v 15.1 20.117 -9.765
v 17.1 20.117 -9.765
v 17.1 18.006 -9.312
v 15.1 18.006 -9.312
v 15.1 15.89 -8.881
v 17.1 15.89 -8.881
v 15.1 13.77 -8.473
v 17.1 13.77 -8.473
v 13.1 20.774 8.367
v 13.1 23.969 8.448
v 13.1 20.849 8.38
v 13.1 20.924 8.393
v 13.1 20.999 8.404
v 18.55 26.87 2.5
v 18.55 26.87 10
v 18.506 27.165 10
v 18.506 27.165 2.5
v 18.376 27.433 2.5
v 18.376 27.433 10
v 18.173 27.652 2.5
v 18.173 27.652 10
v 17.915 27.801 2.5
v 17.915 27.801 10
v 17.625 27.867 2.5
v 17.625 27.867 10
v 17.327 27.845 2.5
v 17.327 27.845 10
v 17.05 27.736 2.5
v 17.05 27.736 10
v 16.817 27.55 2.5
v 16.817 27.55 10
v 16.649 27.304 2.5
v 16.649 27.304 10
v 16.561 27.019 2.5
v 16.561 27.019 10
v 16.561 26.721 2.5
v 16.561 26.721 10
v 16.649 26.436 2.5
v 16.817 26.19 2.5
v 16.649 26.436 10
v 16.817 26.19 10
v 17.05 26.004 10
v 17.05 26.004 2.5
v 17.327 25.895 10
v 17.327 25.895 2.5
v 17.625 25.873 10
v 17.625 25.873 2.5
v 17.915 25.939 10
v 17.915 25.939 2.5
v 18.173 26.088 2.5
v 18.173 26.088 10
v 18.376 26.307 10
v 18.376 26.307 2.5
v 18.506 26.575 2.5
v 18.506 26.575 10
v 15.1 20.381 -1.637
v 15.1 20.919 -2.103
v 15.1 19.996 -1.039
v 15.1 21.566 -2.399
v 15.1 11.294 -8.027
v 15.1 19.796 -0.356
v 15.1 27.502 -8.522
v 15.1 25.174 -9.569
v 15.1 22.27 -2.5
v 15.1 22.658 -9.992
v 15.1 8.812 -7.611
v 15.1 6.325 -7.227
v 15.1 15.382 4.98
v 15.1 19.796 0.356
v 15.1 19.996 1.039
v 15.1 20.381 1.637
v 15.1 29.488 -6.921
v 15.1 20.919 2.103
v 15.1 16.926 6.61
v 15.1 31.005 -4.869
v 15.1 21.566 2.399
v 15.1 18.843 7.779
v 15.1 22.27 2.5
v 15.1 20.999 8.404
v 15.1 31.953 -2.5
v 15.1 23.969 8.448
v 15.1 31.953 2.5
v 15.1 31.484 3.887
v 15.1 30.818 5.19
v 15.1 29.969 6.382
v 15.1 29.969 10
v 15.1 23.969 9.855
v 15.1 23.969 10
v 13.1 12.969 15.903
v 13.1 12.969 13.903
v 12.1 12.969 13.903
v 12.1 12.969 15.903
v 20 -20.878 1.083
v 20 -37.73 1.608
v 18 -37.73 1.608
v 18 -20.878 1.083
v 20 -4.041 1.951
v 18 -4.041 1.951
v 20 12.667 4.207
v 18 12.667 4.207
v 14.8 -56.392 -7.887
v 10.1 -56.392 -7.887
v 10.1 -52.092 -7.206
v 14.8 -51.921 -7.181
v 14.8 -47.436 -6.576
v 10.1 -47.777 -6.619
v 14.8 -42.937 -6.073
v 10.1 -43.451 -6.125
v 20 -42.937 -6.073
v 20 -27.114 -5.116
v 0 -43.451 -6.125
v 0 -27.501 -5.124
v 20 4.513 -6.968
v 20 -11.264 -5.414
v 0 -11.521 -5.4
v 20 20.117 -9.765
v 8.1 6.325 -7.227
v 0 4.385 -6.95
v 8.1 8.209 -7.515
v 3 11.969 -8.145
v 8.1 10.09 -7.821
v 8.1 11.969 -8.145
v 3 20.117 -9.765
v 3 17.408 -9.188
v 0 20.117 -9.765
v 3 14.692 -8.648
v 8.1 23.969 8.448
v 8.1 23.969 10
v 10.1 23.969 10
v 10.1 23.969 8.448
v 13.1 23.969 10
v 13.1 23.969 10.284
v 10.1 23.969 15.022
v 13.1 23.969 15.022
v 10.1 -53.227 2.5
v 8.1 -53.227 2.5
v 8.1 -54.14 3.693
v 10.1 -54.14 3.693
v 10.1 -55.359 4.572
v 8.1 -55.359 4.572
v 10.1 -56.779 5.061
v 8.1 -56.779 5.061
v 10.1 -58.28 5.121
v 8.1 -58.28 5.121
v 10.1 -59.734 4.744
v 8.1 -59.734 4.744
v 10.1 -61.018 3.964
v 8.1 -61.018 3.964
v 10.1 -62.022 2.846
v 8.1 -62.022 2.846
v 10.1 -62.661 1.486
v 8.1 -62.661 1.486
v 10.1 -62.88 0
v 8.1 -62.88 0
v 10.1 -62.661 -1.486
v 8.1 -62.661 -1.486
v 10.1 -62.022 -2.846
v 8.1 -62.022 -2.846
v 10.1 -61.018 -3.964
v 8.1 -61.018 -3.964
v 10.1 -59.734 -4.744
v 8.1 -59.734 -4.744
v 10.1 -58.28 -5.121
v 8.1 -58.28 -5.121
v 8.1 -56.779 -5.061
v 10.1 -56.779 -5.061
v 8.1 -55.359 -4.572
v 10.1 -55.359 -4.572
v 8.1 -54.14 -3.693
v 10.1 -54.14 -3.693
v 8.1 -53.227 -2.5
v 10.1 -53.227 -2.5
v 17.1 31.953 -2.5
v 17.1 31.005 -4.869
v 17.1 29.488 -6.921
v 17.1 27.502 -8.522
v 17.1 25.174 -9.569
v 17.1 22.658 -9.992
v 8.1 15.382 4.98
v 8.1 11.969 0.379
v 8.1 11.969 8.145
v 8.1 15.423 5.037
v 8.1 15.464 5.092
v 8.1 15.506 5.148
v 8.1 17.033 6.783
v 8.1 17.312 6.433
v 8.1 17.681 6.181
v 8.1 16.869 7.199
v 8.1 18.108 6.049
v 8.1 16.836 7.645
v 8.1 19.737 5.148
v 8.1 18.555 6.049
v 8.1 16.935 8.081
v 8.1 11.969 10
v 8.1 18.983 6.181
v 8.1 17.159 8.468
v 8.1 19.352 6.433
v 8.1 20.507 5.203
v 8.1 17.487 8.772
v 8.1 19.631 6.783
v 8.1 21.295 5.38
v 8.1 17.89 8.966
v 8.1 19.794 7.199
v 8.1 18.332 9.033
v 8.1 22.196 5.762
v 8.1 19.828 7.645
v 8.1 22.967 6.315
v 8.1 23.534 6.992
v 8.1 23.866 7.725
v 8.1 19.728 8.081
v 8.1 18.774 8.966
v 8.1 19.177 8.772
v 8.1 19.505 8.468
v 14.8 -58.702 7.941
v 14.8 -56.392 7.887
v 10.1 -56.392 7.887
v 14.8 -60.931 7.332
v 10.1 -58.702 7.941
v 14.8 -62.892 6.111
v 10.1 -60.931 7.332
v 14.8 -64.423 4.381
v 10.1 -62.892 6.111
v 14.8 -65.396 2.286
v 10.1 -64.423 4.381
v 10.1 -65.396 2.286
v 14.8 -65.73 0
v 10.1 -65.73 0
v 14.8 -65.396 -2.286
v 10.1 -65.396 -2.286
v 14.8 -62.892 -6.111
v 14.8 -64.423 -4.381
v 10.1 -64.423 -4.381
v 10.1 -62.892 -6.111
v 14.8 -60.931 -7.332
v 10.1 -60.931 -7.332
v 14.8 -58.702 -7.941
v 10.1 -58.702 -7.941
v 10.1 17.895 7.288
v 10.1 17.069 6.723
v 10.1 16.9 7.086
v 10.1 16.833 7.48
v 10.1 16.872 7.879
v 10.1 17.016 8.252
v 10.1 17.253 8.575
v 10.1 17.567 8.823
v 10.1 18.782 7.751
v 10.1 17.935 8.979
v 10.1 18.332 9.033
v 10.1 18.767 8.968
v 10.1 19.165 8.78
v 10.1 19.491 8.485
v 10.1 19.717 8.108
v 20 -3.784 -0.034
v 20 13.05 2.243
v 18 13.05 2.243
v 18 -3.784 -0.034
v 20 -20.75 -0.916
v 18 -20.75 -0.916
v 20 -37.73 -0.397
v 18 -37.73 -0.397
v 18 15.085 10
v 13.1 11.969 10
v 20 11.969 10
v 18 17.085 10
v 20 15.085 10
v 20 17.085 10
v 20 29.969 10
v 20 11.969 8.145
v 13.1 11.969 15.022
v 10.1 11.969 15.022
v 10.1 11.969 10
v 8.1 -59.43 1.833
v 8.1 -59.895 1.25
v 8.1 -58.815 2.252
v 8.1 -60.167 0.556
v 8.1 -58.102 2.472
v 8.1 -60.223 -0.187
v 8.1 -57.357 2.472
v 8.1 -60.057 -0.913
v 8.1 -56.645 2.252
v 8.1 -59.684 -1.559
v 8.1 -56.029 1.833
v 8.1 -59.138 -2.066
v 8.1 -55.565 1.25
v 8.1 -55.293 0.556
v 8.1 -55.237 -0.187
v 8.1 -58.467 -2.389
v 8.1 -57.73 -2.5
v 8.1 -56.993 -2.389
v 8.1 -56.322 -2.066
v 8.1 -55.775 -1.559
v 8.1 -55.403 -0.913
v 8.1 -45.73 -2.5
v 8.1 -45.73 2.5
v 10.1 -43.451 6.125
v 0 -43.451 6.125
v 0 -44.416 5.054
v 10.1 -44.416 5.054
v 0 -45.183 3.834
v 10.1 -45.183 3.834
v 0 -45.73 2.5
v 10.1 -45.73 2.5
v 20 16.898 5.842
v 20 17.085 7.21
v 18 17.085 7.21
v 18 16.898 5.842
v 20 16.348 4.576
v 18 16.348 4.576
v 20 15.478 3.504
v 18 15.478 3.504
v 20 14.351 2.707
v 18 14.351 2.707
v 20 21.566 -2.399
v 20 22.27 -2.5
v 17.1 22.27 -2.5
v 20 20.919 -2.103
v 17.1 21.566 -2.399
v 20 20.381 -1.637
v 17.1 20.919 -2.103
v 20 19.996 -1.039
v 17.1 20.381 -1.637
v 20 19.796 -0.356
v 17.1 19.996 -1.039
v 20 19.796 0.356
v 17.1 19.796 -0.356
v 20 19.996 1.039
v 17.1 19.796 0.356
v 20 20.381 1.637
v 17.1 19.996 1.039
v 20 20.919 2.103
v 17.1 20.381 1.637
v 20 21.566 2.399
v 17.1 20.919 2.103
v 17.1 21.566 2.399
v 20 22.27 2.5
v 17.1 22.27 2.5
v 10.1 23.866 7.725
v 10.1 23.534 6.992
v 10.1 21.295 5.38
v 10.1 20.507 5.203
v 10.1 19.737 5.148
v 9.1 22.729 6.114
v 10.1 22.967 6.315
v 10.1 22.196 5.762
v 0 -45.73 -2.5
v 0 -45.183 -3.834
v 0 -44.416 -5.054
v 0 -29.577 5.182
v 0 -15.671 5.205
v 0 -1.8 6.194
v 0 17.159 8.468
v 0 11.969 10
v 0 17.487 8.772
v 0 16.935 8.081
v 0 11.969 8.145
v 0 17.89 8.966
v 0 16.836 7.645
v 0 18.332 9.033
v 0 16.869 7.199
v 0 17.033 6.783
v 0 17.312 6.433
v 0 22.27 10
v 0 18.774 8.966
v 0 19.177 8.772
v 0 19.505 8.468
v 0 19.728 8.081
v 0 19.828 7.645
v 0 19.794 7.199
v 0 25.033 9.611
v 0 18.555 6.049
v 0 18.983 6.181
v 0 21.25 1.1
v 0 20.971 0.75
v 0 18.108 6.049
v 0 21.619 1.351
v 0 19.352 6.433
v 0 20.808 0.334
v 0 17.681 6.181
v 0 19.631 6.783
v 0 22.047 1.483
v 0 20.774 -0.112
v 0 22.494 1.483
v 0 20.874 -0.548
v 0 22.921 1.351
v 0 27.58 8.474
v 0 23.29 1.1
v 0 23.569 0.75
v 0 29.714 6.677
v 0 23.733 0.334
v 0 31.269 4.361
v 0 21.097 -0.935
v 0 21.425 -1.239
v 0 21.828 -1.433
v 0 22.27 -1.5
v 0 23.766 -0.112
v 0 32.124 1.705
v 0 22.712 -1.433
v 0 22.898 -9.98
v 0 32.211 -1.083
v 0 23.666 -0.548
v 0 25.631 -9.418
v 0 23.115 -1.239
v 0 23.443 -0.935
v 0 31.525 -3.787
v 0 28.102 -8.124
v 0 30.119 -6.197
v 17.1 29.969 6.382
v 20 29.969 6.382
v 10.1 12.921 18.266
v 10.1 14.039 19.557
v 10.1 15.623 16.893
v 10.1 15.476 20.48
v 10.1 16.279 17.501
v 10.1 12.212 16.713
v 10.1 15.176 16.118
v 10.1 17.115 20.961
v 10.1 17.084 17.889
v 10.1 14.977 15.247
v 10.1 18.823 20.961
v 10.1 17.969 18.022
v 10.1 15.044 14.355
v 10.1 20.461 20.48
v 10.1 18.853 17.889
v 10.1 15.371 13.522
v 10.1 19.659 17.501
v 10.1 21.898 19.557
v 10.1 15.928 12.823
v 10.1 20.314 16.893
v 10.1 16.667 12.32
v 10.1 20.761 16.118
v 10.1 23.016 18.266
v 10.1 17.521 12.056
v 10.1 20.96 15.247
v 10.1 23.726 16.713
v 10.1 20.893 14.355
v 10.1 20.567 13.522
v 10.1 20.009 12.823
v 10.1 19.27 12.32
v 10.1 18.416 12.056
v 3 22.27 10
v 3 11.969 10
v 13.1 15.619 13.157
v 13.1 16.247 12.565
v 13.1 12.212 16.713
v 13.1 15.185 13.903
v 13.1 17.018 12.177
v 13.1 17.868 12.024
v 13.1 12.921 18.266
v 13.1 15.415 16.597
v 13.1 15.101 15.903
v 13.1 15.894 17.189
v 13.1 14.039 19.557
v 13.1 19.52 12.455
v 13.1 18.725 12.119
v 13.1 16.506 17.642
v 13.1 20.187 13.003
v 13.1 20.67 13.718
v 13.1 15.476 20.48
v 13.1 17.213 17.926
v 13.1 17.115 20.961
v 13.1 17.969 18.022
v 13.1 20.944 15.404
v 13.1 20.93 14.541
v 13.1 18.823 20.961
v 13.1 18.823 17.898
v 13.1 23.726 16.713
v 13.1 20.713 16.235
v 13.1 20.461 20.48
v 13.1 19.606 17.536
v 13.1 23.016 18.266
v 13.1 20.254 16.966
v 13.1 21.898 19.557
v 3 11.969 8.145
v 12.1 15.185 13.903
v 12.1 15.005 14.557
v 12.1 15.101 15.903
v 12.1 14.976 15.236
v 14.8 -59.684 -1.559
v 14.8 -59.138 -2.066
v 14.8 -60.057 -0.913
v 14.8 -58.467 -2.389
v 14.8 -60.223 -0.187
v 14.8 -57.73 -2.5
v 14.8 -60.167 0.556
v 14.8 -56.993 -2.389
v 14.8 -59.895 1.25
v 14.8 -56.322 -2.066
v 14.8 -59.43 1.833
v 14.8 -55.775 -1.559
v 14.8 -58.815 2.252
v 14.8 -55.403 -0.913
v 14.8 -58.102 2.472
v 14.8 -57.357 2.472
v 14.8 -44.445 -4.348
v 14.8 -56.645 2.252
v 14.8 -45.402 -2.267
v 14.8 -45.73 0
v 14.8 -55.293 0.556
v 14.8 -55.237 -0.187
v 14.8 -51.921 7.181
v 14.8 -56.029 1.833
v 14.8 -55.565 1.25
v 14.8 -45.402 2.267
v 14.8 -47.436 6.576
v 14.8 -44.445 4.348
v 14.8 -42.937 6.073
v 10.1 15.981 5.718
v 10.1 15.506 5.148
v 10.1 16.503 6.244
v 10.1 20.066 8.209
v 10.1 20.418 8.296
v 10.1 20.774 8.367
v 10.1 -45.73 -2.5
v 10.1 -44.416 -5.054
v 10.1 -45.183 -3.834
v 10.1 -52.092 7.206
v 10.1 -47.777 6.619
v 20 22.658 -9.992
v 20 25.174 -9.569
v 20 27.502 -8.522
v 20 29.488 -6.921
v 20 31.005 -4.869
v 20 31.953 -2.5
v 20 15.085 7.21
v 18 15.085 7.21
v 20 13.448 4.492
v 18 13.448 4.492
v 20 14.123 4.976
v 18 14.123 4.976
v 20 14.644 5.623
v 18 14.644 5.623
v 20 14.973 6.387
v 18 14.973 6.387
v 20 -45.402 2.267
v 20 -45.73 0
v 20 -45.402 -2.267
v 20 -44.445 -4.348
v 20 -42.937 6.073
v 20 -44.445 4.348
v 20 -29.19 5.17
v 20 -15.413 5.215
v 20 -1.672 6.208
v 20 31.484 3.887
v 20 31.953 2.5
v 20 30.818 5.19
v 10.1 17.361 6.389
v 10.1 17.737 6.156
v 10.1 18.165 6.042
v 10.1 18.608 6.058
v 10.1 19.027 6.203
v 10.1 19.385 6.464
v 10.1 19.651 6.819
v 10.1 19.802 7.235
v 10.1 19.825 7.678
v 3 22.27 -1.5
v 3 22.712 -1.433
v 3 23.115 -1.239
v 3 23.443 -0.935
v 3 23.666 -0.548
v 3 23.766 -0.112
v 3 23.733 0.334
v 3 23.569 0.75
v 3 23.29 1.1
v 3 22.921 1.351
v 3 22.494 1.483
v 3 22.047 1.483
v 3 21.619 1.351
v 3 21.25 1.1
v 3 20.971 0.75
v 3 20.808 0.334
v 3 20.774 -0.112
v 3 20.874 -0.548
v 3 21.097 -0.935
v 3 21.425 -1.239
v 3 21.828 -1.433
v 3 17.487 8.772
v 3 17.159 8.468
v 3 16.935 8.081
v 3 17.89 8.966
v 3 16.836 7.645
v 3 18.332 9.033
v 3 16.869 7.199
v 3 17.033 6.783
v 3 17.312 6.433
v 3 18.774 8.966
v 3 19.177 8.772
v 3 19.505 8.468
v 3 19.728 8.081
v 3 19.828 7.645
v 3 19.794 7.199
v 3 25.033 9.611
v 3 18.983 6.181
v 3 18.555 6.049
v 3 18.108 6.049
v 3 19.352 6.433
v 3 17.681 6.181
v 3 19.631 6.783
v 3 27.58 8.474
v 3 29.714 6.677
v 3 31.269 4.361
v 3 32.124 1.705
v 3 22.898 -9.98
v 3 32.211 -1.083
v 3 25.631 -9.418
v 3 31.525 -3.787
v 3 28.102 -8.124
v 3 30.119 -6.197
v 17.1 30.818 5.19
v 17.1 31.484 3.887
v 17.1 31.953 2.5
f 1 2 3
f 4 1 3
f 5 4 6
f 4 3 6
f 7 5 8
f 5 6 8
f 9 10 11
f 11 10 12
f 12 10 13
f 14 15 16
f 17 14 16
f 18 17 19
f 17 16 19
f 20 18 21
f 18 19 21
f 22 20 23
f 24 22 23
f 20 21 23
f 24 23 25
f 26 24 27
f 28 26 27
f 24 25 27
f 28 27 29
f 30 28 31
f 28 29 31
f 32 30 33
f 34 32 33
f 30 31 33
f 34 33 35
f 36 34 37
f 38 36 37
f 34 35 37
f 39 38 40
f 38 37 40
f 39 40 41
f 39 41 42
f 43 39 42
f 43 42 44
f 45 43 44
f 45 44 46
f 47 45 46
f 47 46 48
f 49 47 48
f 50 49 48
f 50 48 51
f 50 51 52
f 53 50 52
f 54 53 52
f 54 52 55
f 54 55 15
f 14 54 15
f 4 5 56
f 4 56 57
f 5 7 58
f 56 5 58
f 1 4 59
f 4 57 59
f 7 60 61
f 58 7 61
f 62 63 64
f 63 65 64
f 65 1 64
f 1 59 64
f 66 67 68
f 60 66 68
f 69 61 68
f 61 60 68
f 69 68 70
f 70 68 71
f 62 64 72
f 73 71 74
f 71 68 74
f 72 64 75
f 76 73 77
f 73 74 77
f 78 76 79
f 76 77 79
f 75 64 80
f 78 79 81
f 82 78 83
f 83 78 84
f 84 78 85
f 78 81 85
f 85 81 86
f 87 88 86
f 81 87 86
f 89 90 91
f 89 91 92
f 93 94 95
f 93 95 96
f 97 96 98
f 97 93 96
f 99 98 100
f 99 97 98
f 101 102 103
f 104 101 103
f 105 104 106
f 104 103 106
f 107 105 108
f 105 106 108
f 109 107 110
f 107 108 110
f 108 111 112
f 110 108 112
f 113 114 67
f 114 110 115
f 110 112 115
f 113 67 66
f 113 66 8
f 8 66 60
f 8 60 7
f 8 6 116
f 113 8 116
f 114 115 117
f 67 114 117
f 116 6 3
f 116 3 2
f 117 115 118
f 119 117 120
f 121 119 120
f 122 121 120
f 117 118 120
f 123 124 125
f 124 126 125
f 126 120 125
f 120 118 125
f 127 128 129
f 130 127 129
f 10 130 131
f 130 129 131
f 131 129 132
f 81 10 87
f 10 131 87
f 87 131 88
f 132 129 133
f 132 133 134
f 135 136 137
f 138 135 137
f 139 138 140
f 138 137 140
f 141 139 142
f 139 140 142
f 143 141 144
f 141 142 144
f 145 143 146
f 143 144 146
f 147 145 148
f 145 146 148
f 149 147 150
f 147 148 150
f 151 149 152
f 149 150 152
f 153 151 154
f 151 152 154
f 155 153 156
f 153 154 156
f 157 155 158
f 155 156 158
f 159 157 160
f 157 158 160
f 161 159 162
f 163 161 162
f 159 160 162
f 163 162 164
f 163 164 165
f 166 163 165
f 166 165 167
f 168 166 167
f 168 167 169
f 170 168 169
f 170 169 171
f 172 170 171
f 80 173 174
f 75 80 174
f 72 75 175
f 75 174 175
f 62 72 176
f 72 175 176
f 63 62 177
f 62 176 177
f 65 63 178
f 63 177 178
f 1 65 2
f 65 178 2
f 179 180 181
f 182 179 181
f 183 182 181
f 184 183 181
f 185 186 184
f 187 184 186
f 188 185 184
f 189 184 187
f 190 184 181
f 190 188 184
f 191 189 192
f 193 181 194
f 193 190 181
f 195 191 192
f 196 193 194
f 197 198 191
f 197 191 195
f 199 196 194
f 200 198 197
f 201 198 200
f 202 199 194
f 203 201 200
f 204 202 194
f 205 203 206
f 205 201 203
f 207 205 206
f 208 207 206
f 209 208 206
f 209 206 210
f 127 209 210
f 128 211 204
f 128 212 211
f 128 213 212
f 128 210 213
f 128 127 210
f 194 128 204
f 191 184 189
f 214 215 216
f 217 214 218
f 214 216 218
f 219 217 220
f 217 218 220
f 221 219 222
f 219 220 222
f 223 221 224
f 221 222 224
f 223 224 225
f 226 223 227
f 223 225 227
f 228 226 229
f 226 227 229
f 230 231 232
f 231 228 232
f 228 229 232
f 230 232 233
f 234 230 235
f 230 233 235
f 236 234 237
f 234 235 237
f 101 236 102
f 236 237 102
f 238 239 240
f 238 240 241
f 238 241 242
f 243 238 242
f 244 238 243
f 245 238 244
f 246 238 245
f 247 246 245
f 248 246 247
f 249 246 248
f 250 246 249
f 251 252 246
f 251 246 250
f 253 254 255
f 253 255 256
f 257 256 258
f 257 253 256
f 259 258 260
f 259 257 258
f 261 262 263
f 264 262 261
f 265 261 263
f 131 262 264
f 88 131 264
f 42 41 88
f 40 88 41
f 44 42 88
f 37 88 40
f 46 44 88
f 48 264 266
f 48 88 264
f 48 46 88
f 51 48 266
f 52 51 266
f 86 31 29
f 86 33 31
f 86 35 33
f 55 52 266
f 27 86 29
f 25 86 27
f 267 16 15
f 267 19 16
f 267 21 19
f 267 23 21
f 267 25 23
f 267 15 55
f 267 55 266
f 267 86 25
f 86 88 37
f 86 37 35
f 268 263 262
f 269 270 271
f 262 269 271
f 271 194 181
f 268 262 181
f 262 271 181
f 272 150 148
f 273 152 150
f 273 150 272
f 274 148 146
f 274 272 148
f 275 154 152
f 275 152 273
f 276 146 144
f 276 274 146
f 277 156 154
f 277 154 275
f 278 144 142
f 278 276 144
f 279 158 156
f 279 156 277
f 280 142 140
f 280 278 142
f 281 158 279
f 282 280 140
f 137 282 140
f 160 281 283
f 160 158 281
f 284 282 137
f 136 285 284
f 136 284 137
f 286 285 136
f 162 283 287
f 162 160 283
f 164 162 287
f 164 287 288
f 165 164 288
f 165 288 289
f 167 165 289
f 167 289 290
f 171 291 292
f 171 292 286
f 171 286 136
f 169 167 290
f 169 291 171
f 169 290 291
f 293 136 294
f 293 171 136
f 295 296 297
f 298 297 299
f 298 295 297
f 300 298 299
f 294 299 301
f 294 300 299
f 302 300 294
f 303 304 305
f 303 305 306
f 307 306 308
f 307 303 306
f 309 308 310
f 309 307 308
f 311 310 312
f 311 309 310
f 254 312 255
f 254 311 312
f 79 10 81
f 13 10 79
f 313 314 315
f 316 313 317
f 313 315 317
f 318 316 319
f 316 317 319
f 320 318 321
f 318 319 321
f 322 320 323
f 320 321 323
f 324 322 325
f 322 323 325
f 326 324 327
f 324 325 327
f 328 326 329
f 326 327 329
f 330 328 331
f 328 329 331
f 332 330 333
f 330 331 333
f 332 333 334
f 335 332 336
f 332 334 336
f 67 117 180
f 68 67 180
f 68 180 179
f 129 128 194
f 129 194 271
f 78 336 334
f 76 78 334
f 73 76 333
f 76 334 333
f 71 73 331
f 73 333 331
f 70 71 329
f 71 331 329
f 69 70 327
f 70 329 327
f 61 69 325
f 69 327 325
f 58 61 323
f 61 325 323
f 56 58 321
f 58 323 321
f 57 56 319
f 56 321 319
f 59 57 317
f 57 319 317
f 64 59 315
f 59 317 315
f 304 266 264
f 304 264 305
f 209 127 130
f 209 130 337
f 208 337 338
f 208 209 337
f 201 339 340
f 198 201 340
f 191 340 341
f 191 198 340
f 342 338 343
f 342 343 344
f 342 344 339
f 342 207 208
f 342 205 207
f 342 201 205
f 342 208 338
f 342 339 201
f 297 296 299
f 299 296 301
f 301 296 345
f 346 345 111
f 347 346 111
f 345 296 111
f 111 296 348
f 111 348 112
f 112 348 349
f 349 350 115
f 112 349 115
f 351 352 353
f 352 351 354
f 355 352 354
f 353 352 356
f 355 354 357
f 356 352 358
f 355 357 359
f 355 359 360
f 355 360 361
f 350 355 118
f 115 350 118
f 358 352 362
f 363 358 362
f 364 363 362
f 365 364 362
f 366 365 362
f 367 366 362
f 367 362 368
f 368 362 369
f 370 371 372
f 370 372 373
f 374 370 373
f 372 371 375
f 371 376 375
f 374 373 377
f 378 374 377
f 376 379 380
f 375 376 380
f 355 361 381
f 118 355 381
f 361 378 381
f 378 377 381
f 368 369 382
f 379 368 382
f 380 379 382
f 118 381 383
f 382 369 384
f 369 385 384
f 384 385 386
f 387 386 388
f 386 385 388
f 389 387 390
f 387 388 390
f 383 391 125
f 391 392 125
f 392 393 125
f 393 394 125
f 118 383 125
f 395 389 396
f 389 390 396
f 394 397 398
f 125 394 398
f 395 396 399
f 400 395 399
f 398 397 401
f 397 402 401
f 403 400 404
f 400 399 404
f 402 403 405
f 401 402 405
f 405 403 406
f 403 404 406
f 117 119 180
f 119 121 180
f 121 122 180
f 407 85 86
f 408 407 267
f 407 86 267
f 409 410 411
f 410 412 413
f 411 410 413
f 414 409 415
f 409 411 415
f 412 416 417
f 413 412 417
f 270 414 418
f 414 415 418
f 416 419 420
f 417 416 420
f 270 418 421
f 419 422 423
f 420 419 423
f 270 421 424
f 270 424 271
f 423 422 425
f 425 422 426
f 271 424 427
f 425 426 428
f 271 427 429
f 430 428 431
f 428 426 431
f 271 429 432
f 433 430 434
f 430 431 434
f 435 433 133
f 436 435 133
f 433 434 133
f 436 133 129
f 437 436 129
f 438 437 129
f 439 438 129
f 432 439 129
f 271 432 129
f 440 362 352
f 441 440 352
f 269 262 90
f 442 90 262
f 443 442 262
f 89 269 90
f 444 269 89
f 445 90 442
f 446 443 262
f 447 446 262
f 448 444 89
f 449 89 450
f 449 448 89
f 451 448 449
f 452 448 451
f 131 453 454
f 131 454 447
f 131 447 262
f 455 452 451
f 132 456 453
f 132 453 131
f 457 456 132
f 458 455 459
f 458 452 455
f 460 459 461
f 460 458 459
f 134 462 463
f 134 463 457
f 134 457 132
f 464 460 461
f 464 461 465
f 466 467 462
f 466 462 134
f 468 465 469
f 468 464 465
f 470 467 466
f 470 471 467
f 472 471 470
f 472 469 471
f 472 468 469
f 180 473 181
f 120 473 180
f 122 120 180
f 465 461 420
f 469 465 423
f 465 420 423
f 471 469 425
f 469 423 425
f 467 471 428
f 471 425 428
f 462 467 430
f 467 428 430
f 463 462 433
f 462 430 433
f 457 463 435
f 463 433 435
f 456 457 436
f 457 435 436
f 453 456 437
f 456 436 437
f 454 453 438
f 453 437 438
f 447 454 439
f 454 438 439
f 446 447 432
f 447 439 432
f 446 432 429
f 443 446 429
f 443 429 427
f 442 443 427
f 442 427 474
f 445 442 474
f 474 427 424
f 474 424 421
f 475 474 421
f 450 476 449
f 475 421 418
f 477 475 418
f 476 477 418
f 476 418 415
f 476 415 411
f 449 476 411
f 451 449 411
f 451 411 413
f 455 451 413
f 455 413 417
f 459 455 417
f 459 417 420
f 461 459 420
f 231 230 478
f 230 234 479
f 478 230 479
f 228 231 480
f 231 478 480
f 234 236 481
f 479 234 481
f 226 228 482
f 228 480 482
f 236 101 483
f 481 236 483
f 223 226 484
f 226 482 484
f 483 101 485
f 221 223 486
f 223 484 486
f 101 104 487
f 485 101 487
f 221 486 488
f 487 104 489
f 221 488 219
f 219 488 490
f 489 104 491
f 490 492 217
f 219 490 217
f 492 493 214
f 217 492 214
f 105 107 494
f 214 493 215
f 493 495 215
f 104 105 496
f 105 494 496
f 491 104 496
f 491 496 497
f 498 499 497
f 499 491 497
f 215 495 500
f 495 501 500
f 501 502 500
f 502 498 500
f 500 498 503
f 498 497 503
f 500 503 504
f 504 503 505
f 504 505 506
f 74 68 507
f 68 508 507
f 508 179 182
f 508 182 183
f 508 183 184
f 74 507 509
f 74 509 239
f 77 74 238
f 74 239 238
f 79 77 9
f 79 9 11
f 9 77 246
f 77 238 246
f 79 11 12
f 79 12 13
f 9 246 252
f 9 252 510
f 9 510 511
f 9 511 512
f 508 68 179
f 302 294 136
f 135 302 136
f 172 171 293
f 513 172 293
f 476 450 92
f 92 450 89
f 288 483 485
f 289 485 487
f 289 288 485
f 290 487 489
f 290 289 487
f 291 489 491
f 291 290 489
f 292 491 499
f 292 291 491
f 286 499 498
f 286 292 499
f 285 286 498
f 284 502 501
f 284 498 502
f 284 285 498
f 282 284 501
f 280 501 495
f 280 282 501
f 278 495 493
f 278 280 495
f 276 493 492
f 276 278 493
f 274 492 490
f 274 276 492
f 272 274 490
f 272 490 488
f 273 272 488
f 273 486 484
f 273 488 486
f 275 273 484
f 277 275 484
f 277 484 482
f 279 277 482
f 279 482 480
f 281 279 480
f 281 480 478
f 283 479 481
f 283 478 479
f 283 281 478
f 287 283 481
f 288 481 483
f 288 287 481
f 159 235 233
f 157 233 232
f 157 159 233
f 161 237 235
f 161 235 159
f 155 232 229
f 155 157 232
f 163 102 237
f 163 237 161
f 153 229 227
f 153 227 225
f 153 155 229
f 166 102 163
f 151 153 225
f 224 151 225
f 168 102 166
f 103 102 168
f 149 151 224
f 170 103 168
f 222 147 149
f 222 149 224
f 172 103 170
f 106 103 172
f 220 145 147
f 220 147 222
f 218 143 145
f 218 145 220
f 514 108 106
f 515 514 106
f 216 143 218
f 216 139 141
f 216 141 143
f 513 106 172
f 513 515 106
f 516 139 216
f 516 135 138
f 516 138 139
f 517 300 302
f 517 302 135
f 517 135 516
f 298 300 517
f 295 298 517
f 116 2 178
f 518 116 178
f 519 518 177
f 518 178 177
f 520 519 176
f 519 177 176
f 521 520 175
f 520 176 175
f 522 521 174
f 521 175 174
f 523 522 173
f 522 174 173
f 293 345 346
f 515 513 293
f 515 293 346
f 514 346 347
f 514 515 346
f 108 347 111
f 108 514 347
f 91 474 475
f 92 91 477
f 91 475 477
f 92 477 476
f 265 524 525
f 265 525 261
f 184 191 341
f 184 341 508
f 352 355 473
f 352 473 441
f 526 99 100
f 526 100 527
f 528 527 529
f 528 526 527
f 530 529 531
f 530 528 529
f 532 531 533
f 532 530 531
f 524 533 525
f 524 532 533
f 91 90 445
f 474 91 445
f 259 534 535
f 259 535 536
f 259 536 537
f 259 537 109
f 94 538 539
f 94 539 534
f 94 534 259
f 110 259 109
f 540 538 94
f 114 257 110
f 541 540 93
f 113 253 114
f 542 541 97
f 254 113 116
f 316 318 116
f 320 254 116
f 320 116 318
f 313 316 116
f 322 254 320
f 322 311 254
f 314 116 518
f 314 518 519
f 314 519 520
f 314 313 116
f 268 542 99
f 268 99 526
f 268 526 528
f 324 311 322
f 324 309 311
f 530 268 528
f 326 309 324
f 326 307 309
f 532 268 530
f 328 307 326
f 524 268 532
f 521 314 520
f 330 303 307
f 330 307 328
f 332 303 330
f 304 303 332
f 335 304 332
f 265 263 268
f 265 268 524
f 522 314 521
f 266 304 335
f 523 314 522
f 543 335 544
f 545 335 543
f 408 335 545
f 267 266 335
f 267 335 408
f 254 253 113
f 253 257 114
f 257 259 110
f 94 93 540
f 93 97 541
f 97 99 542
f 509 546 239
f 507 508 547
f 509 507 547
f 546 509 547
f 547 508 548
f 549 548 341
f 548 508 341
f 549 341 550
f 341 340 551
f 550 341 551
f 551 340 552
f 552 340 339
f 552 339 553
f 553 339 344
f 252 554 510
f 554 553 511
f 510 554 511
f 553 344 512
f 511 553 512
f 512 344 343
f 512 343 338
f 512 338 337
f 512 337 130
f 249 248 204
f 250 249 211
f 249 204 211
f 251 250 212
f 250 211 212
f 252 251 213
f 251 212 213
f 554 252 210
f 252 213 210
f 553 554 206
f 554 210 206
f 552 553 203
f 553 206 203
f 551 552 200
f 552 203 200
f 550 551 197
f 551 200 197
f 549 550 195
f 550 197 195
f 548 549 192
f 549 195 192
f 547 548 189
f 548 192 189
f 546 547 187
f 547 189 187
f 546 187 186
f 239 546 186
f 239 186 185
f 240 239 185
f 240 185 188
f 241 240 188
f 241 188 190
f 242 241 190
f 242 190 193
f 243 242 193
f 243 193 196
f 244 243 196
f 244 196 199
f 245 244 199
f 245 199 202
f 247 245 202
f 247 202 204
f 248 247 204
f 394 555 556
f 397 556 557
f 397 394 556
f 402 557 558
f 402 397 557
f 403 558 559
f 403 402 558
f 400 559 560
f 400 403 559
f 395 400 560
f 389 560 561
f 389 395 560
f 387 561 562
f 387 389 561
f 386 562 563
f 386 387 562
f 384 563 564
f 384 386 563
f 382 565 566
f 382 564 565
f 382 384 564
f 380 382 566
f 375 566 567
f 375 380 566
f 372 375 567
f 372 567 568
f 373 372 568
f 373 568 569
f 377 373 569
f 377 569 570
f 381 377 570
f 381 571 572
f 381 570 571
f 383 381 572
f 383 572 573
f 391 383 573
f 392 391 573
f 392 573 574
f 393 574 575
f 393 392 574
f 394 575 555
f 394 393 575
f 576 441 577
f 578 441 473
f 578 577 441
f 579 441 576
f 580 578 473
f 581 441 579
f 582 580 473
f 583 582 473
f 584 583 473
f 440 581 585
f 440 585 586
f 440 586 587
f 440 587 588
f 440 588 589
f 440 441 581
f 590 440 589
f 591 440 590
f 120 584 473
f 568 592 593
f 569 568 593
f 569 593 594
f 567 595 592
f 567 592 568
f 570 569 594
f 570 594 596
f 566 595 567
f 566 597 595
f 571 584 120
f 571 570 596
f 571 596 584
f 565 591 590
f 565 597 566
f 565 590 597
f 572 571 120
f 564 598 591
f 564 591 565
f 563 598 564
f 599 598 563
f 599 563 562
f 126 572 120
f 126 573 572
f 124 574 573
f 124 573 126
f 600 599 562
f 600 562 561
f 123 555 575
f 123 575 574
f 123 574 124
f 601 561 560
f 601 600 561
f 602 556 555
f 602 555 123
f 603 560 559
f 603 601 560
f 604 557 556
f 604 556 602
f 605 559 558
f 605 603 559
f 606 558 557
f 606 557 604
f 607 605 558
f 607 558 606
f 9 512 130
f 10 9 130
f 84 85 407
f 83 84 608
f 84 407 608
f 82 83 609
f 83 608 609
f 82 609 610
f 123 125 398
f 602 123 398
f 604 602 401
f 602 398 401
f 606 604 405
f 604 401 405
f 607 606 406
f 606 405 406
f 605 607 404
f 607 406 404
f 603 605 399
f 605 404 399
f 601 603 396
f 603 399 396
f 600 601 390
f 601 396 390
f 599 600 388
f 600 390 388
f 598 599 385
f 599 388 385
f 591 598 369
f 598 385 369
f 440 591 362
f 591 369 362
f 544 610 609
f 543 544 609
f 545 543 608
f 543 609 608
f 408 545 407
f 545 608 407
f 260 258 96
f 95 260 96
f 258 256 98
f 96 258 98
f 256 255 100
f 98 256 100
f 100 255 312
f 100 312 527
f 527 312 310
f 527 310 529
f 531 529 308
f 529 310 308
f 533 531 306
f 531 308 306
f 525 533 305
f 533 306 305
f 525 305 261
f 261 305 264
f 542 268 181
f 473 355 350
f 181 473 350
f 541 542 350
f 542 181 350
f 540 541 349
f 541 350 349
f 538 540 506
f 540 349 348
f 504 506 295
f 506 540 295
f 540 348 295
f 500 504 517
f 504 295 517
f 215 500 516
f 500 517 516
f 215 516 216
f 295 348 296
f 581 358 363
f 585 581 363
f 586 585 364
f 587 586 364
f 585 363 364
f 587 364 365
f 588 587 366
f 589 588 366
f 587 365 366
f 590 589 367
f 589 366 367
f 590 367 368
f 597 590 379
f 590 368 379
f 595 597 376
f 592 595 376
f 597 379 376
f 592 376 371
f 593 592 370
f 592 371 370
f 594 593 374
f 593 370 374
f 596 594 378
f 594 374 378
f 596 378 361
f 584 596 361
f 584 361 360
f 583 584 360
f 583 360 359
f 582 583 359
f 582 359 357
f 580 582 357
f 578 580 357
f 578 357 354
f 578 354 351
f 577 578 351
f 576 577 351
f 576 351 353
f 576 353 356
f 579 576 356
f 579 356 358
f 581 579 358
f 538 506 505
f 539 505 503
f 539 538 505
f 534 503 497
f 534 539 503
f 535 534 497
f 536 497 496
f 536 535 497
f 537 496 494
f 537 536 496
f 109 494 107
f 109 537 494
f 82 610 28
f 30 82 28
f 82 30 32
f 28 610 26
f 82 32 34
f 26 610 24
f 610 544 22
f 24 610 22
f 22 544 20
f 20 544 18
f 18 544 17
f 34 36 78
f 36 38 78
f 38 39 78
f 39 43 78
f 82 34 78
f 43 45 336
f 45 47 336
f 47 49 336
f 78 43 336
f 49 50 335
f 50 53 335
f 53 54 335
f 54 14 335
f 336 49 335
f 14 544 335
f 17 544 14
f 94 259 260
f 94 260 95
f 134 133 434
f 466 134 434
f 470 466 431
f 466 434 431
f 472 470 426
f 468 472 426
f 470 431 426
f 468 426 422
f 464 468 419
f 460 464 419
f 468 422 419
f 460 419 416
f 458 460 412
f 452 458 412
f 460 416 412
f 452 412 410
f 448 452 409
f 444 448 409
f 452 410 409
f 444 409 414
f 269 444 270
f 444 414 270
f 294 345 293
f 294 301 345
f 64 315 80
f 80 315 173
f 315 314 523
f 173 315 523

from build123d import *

# Parameters (mm, degrees)
SKETCH1_R                = 1.5
SKETCH1_R_2              = 2.5
BOSS_EXTRUDE1_DEPTH      = 20
SKETCH2_W                = 8.1
SKETCH2_H                = 20
SKETCH2_W_2              = 5.2
SKETCH2_W_3              = 5.1
CUT_EXTRUDE1_DEPTH       = 20
CUT_EXTRUDE1_DEPTH_BACK  = 20
CUT_EXTRUDE2_DEPTH       = 9
BOSS_EXTRUDE2_DEPTH      = 11.9
SKETCH5_R                = 3
BOSS_EXTRUDE3_DEPTH      = 5
CUT_EXTRUDE6_DEPTH       = 1
SKETCH13_R               = 2.5
CUT_EXTRUDE7_DEPTH       = 4
BOSS_EXTRUDE4_DEPTH      = 3
CUT_EXTRUDE9_DEPTH       = 3
SKETCH17_W               = 9
SKETCH17_H               = 3.569322199
CUT_EXTRUDE11_DEPTH      = 3
SKETCH18_W               = 5.770974844
SKETCH18_H               = 0.772936936
BOSS_EXTRUDE5_DEPTH      = 6.9
BOSS_EXTRUDE5_DEPTH_BACK = 1
SKETCH19_W               = 5.1
SKETCH19_H               = 16.397725614
CUT_EXTRUDE12_DEPTH      = 0.301495
SKETCH20_W               = 5
SKETCH20_H               = 12.419235667
CUT_EXTRUDE13_DEPTH      = 10
BOSS_EXTRUDE6_DEPTH      = 2
SKETCH23_W               = 4.9
SKETCH23_H               = 6
BOSS_EXTRUDE7_DEPTH      = 4
SKETCH22_R               = 1
CUT_EXTRUDE15_DEPTH      = 8
BOSS_EXTRUDE8_DEPTH      = 2
SKETCH14_R               = 1.5
CUT_EXTRUDE8_DEPTH       = 10.1
CUT_EXTRUDE17_DEPTH      = 8.1
CUT_EXTRUDE17_DEPTH_BACK = 2
CUT_EXTRUDE18_DEPTH      = 2
CUT_EXTRUDE20_DEPTH      = 5.2
SKETCH30_W               = 6.9
SKETCH30_H               = 20
CUT_EXTRUDE21_DEPTH      = 0.283797
CUT_EXTRUDE22_REACH      = 91.699
SKETCH31_W               = 2
SKETCH31_H               = 11.022421386
CUT_EXTRUDE23_DEPTH      = 7


with BuildPart() as part:
    # Sketch1 → Boss-Extrude1 (new body)
    with BuildSketch(Plane(origin=(0, 0, 0), x_dir=(0, 0, -1), z_dir=(1, 0, 0))):
        with BuildLine():
            ThreePointArc((9.765353557, 20.116545894), (0, 32.270117322), (-9.765353557, 20.116545894))
            ThreePointArc((-9.765353557, 20.116545894), (-5.132645827, -18.047253777), (-7.88740095, -56.392382678))
            ThreePointArc((-7.88740095, -56.392382678), (0, -65.729882678), (7.88740095, -56.392382678))
            ThreePointArc((7.88740095, -56.392382678), (5.132645827, -18.047253777), (9.765353557, 20.116545894))
        make_face()
        with Locations((0, 22.270117322)):
            Circle(SKETCH1_R, mode=Mode.SUBTRACT)
        with Locations((0, -57.729882678)):
            Circle(SKETCH1_R_2, mode=Mode.SUBTRACT)
    extrude(amount=BOSS_EXTRUDE1_DEPTH)

    # Sketch2 → Cut-Extrude1 (cut, two sides)
    with BuildSketch(Plane.XY) as cut_extrude1_sk:
        with Locations((4.05, -55.729882678)):
            Rectangle(SKETCH2_W, SKETCH2_H)
        with Locations((17.4, -55.729882678)):
            Rectangle(SKETCH2_W_2, SKETCH2_H)
        with Locations((5.55, 22.270117322)):
            Rectangle(SKETCH2_W_3, SKETCH2_H)
    extrude(amount=CUT_EXTRUDE1_DEPTH, mode=Mode.SUBTRACT)
    extrude(cut_extrude1_sk.sketch, amount=-CUT_EXTRUDE1_DEPTH_BACK, mode=Mode.SUBTRACT)

    # Sketch3 → Cut-Extrude2 (cut)
    with BuildSketch(Plane.ZY.offset(-8.1)):
        with BuildLine():
            Line((8.5, 22.270117322), (8.5, 40.909533312))
            Line((8.5, 40.909533312), (-17.52872033, 40.909533312))
            Line((-17.52872033, 40.909533312), (-17.52872033, 13.770117322))
            Line((-17.52872033, 13.770117322), (0, 13.770117322))
            ThreePointArc((0, 13.770117322), (6.01040764, 16.259709682), (8.5, 22.270117322))
        make_face()
    extrude(amount=-CUT_EXTRUDE2_DEPTH, mode=Mode.SUBTRACT)

    # Sketch4 → Boss-Extrude2 (add, through all)
    with BuildSketch(Plane.ZY.offset(-8.1)):
        Polygon((8.5, 27.537944199), (8.283796844, 12.741558936), (10.283796844, 12.741558936), (10.283796844, 27.537944199), align=None)
    extrude(amount=-BOSS_EXTRUDE2_DEPTH)

    # Sketch5 → Boss-Extrude3 (add)
    with BuildSketch(Plane.ZY.offset(-8.1)):
        with BuildLine():
            Line((8.145156861, 11.968622), (8.447845456, 23.968622))
            Line((8.447845456, 23.968622), (9.854698466, 23.968622))
            Line((9.854698466, 23.968622), (15.022421386, 23.968622))
            ThreePointArc((15.022421386, 23.968622), (21.022421386, 17.968622), (15.022421386, 11.968622))
            Line((15.022421386, 11.968622), (8.145156861, 11.968622))
        make_face()
        with Locations((15.022421386, 17.968622)):
            Circle(SKETCH5_R, mode=Mode.SUBTRACT)
    extrude(amount=-BOSS_EXTRUDE3_DEPTH)

    # Sketch12 → Cut-Extrude6 (cut)
    with BuildSketch(Plane(origin=(13.1, 0, 0), x_dir=(0, 0, -1), z_dir=(1, 0, 0))):
        Polygon((-13.902900694, 14.968622), (-13.902900694, 12.968622), (-15.902900694, 12.968622), (-15.902900694, 14.968622), (-15.902900694, 15.294296094), (-13.902900694, 15.294296094), align=None)
    extrude(amount=-CUT_EXTRUDE6_DEPTH, mode=Mode.SUBTRACT)

    # Sketch13 → Cut-Extrude7 (cut)
    with BuildSketch(Plane.ZY.offset(-17.1)):
        with Locations((0, 22.270117322)):
            Circle(SKETCH13_R)
    extrude(amount=-CUT_EXTRUDE7_DEPTH, mode=Mode.SUBTRACT)

    # Sketch15 → Boss-Extrude4 (add)
    with BuildSketch(Plane.ZY):
        Polygon((10, 22.270117322), (10, 11.968622), (8.145156861, 11.968622), (7.595672539, 11.968622), align=None)
    extrude(amount=-BOSS_EXTRUDE4_DEPTH)

    # Sketch16 → Cut-Extrude9 (cut)
    with BuildSketch(Plane(origin=(20, 0, 0), x_dir=(0, 0, -1), z_dir=(1, 0, 0))):
        with BuildLine():
            Line((-10.283796844, 23.968622), (-9.854698466, 23.968622))
            ThreePointArc((-9.854698466, 23.968622), (-9.349264901, 25.818531871), (-8.5, 27.537944199))
            Line((-8.5, 27.537944199), (-10.283796844, 27.537944199))
            Line((-10.283796844, 27.537944199), (-10.283796844, 23.968622))
        make_face()
    extrude(amount=-CUT_EXTRUDE9_DEPTH, mode=Mode.SUBTRACT)

    # Sketch17 → Cut-Extrude11 (cut)
    with BuildSketch(Plane.XY.offset(10.283796844)):
        with Locations((12.6, 25.7532831)):
            Rectangle(SKETCH17_W, SKETCH17_H)
    extrude(amount=-CUT_EXTRUDE11_DEPTH, mode=Mode.SUBTRACT)

    # Sketch18 → Boss-Extrude5 (add, two sides)
    with BuildSketch(Plane(origin=(13.1, 0, 0), x_dir=(0, 0, -1), z_dir=(1, 0, 0))) as boss_extrude5_sk:
        with Locations((-7.398309422, 12.355090468)):
            Rectangle(SKETCH18_W, SKETCH18_H)
    extrude(amount=BOSS_EXTRUDE5_DEPTH)
    extrude(boss_extrude5_sk.sketch, amount=-BOSS_EXTRUDE5_DEPTH_BACK)

    # Sketch19 → Cut-Extrude12 (cut)
    with BuildSketch(Plane(origin=(0, 12.270117322, 0), x_dir=(1, 0, 0), z_dir=(0, 1, 0))):
        with Locations((5.55, 0)):
            Rectangle(SKETCH19_W, SKETCH19_H)
    extrude(amount=-CUT_EXTRUDE12_DEPTH, mode=Mode.SUBTRACT)

    # Sketch20 → Cut-Extrude13 (cut)
    with BuildSketch(Plane.ZY.offset(-17.1)):
        with Locations((0, 28.479735156)):
            Rectangle(SKETCH20_W, SKETCH20_H)
    extrude(amount=-CUT_EXTRUDE13_DEPTH, mode=Mode.SUBTRACT)

    # Sketch21 → Boss-Extrude6 (add)
    with BuildSketch(Plane.ZY.offset(-17.1)):
        with BuildLine():
            Line((-8.473151119, 13.770117322), (0.278481736, 12.273995678))
            ThreePointArc((0.278481736, 12.273995678), (9.936881703, 21.148341047), (2.5, 31.952575688))
            Line((2.5, 31.952575688), (2.5, 22.270117322))
            ThreePointArc((2.5, 22.270117322), (0, 19.770117322), (-2.5, 22.270117322))
            Line((-2.5, 22.270117322), (-2.5, 31.952575688))
            ThreePointArc((-2.5, 31.952575688), (-8.522477621, 27.501501002), (-9.765353557, 20.116545894))
            ThreePointArc((-9.765353557, 20.116545894), (-9.093560923, 16.948562662), (-8.473151119, 13.770117322))
        make_face()
    extrude(amount=BOSS_EXTRUDE6_DEPTH)

    # Sketch23 → Boss-Extrude7 (add)
    with BuildSketch(Plane.XY.offset(10.283796844)):
        with Locations((17.55, 26.968622)):
            Rectangle(SKETCH23_W, SKETCH23_H)
    extrude(amount=-BOSS_EXTRUDE7_DEPTH)

    # Sketch22 → Cut-Extrude15 (cut)
    with BuildSketch(Plane.XY.offset(10.283796844)):
        with Locations((17.55, 26.870117322)):
            Circle(SKETCH22_R)
    extrude(amount=-CUT_EXTRUDE15_DEPTH, mode=Mode.SUBTRACT)

    # Sketch24 → Boss-Extrude8 (add)
    with BuildSketch(Plane.ZY.offset(-8.1)):
        with BuildLine():
            Line((5.147845456, 19.737443909), (5.147845456, 15.506265819))
            Line((5.147845456, 15.506265819), (8.447845456, 15.506265819))
            Line((8.447845456, 15.506265819), (8.447845456, 23.968622))
            add(Edge.make_bspline(
                [(8.447845456, 23.968622), (5.147845456, 23.968622), (5.147845456, 19.737443909)],
                knots=[3.141592654, 3.141592654, 3.141592654, 4.71238898, 4.71238898, 4.71238898], degree=2, weights=[1, 0.707106781, 1]))
        make_face()
    extrude(amount=-BOSS_EXTRUDE8_DEPTH)

    # Sketch14 → Cut-Extrude8 (cut)
    with BuildSketch(Plane.ZY):
        with Locations((7.532575614, 18.331804915)):
            Circle(SKETCH14_R)
    extrude(amount=-CUT_EXTRUDE8_DEPTH, mode=Mode.SUBTRACT)

    # Sketch25 → Cut-Extrude17 (cut, two sides)
    with BuildSketch(Plane.ZY.offset(-8.1)) as cut_extrude17_sk:
        with BuildLine():
            Line((12, -45.729882678), (8.346153846, -36.960651908))
            ThreePointArc((8.346153846, -36.960651908), (6.973852263, -42.37911752), (2.5, -45.729882678))
            Line((2.5, -45.729882678), (2.5, -53.227383372))
            ThreePointArc((2.5, -53.227383372), (0, -62.879882678), (-2.5, -53.227383372))
            Line((-2.5, -53.227383372), (-2.5, -45.729882678))
            ThreePointArc((-2.5, -45.729882678), (-6.973852263, -42.37911752), (-8.346153846, -36.960651908))
            Line((-8.346153846, -36.960651908), (-12, -45.729882678))
            Line((-12, -45.729882678), (-12, -57.729882678))
            ThreePointArc((-12, -57.729882678), (0, -69.729882678), (12, -57.729882678))
            Line((12, -57.729882678), (12, -45.729882678))
        make_face()
    extrude(amount=CUT_EXTRUDE17_DEPTH, mode=Mode.SUBTRACT)
    extrude(cut_extrude17_sk.sketch, amount=-CUT_EXTRUDE17_DEPTH_BACK, mode=Mode.SUBTRACT)

    # Sketch26 → Cut-Extrude18 (cut)
    with BuildSketch(Plane(origin=(20, 0, 0), x_dir=(0, 0, -1), z_dir=(1, 0, 0))):
        with BuildLine():
            Line((-7.209968303, 15.085404497), (-10.283796844, 15.085404497))
            Line((-10.283796844, 15.085404497), (-10.283796844, 17.085404497))
            Line((-10.283796844, 17.085404497), (-7.209968303, 17.085404497))
            ThreePointArc((-7.209968303, 17.085404497), (-4.010444351, 15.949526558), (-2.243391617, 13.050441039))
            ThreePointArc((-2.243391617, 13.050441039), (0.649659998, -12.257973546), (0.397031114, -37.729953741))
            Line((0.397031114, -37.729953741), (-1.608183929, -37.729953741))
            ThreePointArc((-1.608183929, -37.729953741), (-1.343036313, -12.450773719), (-4.206611504, 12.667092093))
            ThreePointArc((-4.206611504, 12.667092093), (-5.281990934, 14.405678614), (-7.209968303, 15.085404497))
        make_face()
    extrude(amount=-CUT_EXTRUDE18_DEPTH, mode=Mode.SUBTRACT)

    # Sketch29 → Cut-Extrude20 (cut)
    with BuildSketch(Plane(origin=(20, 0, 0), x_dir=(0, 0, -1), z_dir=(1, 0, 0))):
        with BuildLine():
            Line((8, -37.729882678), (8.140336581, -37.729882678))
            Line((8.140336581, -37.729882678), (8.140336581, -45.937498976))
            Line((8.140336581, -45.937498976), (-15.754893946, -45.937498976))
            Line((-15.754893946, -45.937498976), (-15.754893946, -37.729882678))
            Line((-15.754893946, -37.729882678), (-8, -37.729882678))
            ThreePointArc((-8, -37.729882678), (0, -45.729882678), (8, -37.729882678))
        make_face()
    extrude(amount=-CUT_EXTRUDE20_DEPTH, mode=Mode.SUBTRACT)

    # Sketch30 → Cut-Extrude21 (cut)
    with BuildSketch(Plane.XY.offset(10.283796844)):
        with Locations((16.55, 21.968622)):
            Rectangle(SKETCH30_W, SKETCH30_H)
    extrude(amount=-CUT_EXTRUDE21_DEPTH, mode=Mode.SUBTRACT)

    # Sketch31 → Cut-Extrude22 (cut, up to next)
    with BuildSketch(Plane(origin=(0, 23.968622, 0), x_dir=(1, 0, 0), z_dir=(0, 1, 0)), mode=Mode.PRIVATE) as cut_extrude22_sk1:
        with Locations((9.1, -15.511210693)):
            Rectangle(SKETCH31_W, SKETCH31_H)
    cut_extrude22_tool1 = extrude(cut_extrude22_sk1.sketch, amount=-CUT_EXTRUDE22_REACH, mode=Mode.PRIVATE) & part.part
    add(cut_extrude22_tool1.solids().sort_by_distance((9.1, 23.968622, 15.511211))[0], mode=Mode.SUBTRACT)

    # Sketch32 → Cut-Extrude23 (cut)
    with BuildSketch(Plane.ZY.offset(-8.1)):
        Polygon((-8.473151119, 13.770117322), (-8.473151119, 5.401068454), (5.147845456, 15.506265819), align=None)
    extrude(amount=-CUT_EXTRUDE23_DEPTH, mode=Mode.SUBTRACT)


solid = part.part
